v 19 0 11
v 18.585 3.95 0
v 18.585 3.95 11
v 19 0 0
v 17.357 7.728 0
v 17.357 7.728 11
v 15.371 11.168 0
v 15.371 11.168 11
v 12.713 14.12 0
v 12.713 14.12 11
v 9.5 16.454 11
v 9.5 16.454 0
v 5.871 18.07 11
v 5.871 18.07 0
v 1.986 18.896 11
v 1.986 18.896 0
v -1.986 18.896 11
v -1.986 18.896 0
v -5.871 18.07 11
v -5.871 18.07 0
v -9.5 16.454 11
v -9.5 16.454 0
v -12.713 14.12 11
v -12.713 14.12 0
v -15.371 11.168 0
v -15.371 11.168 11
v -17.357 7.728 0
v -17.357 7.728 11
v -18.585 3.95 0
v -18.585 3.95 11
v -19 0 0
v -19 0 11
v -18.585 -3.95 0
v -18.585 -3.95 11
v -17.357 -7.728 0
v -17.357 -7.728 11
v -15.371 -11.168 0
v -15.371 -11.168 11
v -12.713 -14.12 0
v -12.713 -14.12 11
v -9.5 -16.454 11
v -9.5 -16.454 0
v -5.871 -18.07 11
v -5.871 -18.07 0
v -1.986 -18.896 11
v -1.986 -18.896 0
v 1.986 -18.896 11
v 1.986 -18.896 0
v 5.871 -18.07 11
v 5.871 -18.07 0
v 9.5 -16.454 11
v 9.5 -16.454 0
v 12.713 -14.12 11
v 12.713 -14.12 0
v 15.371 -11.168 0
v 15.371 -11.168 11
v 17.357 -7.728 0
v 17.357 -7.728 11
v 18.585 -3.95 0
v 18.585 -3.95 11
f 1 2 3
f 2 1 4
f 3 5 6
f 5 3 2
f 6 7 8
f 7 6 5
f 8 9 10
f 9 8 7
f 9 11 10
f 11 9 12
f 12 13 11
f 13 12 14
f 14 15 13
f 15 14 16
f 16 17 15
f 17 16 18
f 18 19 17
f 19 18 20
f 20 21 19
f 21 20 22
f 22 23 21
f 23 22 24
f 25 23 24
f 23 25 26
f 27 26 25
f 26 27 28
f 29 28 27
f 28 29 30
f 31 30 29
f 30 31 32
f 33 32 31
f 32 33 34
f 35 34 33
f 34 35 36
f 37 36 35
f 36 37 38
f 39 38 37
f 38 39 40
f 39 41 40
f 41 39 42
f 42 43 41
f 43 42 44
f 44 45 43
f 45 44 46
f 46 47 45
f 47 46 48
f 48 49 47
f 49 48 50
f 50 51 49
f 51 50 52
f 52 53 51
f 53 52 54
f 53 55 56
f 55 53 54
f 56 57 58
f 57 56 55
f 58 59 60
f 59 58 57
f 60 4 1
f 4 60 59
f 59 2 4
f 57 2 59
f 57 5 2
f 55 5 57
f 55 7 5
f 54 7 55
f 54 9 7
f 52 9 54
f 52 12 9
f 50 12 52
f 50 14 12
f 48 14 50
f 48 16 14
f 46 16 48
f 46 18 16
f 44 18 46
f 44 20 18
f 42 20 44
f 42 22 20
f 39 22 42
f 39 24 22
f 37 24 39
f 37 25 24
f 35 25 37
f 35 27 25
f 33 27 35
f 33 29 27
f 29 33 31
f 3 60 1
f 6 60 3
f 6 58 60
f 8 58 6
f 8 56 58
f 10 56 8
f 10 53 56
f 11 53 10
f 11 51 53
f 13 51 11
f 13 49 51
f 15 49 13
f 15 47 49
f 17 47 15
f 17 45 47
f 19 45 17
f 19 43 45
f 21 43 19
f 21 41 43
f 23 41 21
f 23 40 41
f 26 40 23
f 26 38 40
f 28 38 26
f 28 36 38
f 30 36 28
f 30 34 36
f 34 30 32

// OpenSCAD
// Generated by SolidPython 1.0.1 on 2020-07-29 00:46:44


cylinder(h = 11, r1 = 19, r2 = 19);
/***********************************************
*********      SolidPython code:      **********
************************************************
 
# import packages: SolidPython
from solid import *
from solid.utils import *
from itertools import chain, combinations, permutations


class Resize:

    def __init__(self, scad_file):
        self.scad_file = scad_file
        #self.scad_file = import_scad(scad_file)
        # cone/cylinder param:
        self.r1 = 0
        self.r2 = 0
        self.h = 0
        # rectangular prism param:
        self.w = 0
        self.l = 0
        # ellipse param:
        self.r = 0

    # import OpenScad code (file name corresponds to shape)


    # classify shape + parameters
    def assign(self, param1, param2, param3):
        if self.scad_file == 'cone.scad':
            self.r1 = param1
            self.r2 = param2
            self.h = param3
        elif self.scad_file == 'cylinder.scad':
            self.r1 = param1
            self.r2 = param2
            self.h = param3
        elif self.scad_file == 'rectangularPrism.scad':
            self.h = param1
            self.l = param2
            self.w = param3
        else:
            self.r = param1
            self.h = param2

    # resize parameters
    def iterate(self):
        x = range(3, 20, 2)
        i = 1
        if self.scad_file == 'cone.scad':
            tempList = list(permutations(x, 2))
            for temp in tempList:
                param1 = temp[0]
                param2 = temp[1]
                filepath = 'produced_scad_files/' + 'cone' + str(param1) + '_' + str(param2) + '_' + '.scad'
                scad_render_to_file(cylinder(h=param1, r1=param2, r2=0), filepath)

        elif self.scad_file == 'cylinder.scad':
            tempList = list(permutations(x, 3))
            for temp in tempList:
                param1 = temp[0]
                param2 = temp[1]
                filepath = 'produced_scad_files/' + 'cylinder' + str(param1) + '_' + str(param2) + '_' + '.scad'
                scad_render_to_file(cylinder(h=param1, r1=param2, r2=param2), filepath)

        elif self.scad_file == 'rectangularPrism.scad':
            tempList = list(permutations(x, 3))
            for temp in tempList:
                param1 = temp[0]
                param2 = temp[1]
                param3 = temp[2]
                filepath = 'produced_scad_files/' + 'rectangularPrism' + str(param1) + '_' + str(param2) + '_' + str(
                    param3) + '.scad'
                scad_render_to_file(cube(size=(param1, param2, param3)), filepath)

        elif self.scad_file == 'ellipse.scad':
            tempList = list(permutations(x, 4))
            for temp in tempList:
                param1 = temp[0]
                param2 = temp[1]
                param3 = temp[2]
                param4 = temp[3]
                filepath = 'produced_scad_files/' + 'ellipse' + str(param1) + '_' + str(param2) + '_' + str(param3) + '_' + str(param4) + '.scad'
                scad_render_to_file(scale([param1, param2, param3])(sphere(r=param4)), filepath)

    def render_to_scadfile(self):
        scad_render_to_file(scad, 'example.scad') 
 
************************************************/
